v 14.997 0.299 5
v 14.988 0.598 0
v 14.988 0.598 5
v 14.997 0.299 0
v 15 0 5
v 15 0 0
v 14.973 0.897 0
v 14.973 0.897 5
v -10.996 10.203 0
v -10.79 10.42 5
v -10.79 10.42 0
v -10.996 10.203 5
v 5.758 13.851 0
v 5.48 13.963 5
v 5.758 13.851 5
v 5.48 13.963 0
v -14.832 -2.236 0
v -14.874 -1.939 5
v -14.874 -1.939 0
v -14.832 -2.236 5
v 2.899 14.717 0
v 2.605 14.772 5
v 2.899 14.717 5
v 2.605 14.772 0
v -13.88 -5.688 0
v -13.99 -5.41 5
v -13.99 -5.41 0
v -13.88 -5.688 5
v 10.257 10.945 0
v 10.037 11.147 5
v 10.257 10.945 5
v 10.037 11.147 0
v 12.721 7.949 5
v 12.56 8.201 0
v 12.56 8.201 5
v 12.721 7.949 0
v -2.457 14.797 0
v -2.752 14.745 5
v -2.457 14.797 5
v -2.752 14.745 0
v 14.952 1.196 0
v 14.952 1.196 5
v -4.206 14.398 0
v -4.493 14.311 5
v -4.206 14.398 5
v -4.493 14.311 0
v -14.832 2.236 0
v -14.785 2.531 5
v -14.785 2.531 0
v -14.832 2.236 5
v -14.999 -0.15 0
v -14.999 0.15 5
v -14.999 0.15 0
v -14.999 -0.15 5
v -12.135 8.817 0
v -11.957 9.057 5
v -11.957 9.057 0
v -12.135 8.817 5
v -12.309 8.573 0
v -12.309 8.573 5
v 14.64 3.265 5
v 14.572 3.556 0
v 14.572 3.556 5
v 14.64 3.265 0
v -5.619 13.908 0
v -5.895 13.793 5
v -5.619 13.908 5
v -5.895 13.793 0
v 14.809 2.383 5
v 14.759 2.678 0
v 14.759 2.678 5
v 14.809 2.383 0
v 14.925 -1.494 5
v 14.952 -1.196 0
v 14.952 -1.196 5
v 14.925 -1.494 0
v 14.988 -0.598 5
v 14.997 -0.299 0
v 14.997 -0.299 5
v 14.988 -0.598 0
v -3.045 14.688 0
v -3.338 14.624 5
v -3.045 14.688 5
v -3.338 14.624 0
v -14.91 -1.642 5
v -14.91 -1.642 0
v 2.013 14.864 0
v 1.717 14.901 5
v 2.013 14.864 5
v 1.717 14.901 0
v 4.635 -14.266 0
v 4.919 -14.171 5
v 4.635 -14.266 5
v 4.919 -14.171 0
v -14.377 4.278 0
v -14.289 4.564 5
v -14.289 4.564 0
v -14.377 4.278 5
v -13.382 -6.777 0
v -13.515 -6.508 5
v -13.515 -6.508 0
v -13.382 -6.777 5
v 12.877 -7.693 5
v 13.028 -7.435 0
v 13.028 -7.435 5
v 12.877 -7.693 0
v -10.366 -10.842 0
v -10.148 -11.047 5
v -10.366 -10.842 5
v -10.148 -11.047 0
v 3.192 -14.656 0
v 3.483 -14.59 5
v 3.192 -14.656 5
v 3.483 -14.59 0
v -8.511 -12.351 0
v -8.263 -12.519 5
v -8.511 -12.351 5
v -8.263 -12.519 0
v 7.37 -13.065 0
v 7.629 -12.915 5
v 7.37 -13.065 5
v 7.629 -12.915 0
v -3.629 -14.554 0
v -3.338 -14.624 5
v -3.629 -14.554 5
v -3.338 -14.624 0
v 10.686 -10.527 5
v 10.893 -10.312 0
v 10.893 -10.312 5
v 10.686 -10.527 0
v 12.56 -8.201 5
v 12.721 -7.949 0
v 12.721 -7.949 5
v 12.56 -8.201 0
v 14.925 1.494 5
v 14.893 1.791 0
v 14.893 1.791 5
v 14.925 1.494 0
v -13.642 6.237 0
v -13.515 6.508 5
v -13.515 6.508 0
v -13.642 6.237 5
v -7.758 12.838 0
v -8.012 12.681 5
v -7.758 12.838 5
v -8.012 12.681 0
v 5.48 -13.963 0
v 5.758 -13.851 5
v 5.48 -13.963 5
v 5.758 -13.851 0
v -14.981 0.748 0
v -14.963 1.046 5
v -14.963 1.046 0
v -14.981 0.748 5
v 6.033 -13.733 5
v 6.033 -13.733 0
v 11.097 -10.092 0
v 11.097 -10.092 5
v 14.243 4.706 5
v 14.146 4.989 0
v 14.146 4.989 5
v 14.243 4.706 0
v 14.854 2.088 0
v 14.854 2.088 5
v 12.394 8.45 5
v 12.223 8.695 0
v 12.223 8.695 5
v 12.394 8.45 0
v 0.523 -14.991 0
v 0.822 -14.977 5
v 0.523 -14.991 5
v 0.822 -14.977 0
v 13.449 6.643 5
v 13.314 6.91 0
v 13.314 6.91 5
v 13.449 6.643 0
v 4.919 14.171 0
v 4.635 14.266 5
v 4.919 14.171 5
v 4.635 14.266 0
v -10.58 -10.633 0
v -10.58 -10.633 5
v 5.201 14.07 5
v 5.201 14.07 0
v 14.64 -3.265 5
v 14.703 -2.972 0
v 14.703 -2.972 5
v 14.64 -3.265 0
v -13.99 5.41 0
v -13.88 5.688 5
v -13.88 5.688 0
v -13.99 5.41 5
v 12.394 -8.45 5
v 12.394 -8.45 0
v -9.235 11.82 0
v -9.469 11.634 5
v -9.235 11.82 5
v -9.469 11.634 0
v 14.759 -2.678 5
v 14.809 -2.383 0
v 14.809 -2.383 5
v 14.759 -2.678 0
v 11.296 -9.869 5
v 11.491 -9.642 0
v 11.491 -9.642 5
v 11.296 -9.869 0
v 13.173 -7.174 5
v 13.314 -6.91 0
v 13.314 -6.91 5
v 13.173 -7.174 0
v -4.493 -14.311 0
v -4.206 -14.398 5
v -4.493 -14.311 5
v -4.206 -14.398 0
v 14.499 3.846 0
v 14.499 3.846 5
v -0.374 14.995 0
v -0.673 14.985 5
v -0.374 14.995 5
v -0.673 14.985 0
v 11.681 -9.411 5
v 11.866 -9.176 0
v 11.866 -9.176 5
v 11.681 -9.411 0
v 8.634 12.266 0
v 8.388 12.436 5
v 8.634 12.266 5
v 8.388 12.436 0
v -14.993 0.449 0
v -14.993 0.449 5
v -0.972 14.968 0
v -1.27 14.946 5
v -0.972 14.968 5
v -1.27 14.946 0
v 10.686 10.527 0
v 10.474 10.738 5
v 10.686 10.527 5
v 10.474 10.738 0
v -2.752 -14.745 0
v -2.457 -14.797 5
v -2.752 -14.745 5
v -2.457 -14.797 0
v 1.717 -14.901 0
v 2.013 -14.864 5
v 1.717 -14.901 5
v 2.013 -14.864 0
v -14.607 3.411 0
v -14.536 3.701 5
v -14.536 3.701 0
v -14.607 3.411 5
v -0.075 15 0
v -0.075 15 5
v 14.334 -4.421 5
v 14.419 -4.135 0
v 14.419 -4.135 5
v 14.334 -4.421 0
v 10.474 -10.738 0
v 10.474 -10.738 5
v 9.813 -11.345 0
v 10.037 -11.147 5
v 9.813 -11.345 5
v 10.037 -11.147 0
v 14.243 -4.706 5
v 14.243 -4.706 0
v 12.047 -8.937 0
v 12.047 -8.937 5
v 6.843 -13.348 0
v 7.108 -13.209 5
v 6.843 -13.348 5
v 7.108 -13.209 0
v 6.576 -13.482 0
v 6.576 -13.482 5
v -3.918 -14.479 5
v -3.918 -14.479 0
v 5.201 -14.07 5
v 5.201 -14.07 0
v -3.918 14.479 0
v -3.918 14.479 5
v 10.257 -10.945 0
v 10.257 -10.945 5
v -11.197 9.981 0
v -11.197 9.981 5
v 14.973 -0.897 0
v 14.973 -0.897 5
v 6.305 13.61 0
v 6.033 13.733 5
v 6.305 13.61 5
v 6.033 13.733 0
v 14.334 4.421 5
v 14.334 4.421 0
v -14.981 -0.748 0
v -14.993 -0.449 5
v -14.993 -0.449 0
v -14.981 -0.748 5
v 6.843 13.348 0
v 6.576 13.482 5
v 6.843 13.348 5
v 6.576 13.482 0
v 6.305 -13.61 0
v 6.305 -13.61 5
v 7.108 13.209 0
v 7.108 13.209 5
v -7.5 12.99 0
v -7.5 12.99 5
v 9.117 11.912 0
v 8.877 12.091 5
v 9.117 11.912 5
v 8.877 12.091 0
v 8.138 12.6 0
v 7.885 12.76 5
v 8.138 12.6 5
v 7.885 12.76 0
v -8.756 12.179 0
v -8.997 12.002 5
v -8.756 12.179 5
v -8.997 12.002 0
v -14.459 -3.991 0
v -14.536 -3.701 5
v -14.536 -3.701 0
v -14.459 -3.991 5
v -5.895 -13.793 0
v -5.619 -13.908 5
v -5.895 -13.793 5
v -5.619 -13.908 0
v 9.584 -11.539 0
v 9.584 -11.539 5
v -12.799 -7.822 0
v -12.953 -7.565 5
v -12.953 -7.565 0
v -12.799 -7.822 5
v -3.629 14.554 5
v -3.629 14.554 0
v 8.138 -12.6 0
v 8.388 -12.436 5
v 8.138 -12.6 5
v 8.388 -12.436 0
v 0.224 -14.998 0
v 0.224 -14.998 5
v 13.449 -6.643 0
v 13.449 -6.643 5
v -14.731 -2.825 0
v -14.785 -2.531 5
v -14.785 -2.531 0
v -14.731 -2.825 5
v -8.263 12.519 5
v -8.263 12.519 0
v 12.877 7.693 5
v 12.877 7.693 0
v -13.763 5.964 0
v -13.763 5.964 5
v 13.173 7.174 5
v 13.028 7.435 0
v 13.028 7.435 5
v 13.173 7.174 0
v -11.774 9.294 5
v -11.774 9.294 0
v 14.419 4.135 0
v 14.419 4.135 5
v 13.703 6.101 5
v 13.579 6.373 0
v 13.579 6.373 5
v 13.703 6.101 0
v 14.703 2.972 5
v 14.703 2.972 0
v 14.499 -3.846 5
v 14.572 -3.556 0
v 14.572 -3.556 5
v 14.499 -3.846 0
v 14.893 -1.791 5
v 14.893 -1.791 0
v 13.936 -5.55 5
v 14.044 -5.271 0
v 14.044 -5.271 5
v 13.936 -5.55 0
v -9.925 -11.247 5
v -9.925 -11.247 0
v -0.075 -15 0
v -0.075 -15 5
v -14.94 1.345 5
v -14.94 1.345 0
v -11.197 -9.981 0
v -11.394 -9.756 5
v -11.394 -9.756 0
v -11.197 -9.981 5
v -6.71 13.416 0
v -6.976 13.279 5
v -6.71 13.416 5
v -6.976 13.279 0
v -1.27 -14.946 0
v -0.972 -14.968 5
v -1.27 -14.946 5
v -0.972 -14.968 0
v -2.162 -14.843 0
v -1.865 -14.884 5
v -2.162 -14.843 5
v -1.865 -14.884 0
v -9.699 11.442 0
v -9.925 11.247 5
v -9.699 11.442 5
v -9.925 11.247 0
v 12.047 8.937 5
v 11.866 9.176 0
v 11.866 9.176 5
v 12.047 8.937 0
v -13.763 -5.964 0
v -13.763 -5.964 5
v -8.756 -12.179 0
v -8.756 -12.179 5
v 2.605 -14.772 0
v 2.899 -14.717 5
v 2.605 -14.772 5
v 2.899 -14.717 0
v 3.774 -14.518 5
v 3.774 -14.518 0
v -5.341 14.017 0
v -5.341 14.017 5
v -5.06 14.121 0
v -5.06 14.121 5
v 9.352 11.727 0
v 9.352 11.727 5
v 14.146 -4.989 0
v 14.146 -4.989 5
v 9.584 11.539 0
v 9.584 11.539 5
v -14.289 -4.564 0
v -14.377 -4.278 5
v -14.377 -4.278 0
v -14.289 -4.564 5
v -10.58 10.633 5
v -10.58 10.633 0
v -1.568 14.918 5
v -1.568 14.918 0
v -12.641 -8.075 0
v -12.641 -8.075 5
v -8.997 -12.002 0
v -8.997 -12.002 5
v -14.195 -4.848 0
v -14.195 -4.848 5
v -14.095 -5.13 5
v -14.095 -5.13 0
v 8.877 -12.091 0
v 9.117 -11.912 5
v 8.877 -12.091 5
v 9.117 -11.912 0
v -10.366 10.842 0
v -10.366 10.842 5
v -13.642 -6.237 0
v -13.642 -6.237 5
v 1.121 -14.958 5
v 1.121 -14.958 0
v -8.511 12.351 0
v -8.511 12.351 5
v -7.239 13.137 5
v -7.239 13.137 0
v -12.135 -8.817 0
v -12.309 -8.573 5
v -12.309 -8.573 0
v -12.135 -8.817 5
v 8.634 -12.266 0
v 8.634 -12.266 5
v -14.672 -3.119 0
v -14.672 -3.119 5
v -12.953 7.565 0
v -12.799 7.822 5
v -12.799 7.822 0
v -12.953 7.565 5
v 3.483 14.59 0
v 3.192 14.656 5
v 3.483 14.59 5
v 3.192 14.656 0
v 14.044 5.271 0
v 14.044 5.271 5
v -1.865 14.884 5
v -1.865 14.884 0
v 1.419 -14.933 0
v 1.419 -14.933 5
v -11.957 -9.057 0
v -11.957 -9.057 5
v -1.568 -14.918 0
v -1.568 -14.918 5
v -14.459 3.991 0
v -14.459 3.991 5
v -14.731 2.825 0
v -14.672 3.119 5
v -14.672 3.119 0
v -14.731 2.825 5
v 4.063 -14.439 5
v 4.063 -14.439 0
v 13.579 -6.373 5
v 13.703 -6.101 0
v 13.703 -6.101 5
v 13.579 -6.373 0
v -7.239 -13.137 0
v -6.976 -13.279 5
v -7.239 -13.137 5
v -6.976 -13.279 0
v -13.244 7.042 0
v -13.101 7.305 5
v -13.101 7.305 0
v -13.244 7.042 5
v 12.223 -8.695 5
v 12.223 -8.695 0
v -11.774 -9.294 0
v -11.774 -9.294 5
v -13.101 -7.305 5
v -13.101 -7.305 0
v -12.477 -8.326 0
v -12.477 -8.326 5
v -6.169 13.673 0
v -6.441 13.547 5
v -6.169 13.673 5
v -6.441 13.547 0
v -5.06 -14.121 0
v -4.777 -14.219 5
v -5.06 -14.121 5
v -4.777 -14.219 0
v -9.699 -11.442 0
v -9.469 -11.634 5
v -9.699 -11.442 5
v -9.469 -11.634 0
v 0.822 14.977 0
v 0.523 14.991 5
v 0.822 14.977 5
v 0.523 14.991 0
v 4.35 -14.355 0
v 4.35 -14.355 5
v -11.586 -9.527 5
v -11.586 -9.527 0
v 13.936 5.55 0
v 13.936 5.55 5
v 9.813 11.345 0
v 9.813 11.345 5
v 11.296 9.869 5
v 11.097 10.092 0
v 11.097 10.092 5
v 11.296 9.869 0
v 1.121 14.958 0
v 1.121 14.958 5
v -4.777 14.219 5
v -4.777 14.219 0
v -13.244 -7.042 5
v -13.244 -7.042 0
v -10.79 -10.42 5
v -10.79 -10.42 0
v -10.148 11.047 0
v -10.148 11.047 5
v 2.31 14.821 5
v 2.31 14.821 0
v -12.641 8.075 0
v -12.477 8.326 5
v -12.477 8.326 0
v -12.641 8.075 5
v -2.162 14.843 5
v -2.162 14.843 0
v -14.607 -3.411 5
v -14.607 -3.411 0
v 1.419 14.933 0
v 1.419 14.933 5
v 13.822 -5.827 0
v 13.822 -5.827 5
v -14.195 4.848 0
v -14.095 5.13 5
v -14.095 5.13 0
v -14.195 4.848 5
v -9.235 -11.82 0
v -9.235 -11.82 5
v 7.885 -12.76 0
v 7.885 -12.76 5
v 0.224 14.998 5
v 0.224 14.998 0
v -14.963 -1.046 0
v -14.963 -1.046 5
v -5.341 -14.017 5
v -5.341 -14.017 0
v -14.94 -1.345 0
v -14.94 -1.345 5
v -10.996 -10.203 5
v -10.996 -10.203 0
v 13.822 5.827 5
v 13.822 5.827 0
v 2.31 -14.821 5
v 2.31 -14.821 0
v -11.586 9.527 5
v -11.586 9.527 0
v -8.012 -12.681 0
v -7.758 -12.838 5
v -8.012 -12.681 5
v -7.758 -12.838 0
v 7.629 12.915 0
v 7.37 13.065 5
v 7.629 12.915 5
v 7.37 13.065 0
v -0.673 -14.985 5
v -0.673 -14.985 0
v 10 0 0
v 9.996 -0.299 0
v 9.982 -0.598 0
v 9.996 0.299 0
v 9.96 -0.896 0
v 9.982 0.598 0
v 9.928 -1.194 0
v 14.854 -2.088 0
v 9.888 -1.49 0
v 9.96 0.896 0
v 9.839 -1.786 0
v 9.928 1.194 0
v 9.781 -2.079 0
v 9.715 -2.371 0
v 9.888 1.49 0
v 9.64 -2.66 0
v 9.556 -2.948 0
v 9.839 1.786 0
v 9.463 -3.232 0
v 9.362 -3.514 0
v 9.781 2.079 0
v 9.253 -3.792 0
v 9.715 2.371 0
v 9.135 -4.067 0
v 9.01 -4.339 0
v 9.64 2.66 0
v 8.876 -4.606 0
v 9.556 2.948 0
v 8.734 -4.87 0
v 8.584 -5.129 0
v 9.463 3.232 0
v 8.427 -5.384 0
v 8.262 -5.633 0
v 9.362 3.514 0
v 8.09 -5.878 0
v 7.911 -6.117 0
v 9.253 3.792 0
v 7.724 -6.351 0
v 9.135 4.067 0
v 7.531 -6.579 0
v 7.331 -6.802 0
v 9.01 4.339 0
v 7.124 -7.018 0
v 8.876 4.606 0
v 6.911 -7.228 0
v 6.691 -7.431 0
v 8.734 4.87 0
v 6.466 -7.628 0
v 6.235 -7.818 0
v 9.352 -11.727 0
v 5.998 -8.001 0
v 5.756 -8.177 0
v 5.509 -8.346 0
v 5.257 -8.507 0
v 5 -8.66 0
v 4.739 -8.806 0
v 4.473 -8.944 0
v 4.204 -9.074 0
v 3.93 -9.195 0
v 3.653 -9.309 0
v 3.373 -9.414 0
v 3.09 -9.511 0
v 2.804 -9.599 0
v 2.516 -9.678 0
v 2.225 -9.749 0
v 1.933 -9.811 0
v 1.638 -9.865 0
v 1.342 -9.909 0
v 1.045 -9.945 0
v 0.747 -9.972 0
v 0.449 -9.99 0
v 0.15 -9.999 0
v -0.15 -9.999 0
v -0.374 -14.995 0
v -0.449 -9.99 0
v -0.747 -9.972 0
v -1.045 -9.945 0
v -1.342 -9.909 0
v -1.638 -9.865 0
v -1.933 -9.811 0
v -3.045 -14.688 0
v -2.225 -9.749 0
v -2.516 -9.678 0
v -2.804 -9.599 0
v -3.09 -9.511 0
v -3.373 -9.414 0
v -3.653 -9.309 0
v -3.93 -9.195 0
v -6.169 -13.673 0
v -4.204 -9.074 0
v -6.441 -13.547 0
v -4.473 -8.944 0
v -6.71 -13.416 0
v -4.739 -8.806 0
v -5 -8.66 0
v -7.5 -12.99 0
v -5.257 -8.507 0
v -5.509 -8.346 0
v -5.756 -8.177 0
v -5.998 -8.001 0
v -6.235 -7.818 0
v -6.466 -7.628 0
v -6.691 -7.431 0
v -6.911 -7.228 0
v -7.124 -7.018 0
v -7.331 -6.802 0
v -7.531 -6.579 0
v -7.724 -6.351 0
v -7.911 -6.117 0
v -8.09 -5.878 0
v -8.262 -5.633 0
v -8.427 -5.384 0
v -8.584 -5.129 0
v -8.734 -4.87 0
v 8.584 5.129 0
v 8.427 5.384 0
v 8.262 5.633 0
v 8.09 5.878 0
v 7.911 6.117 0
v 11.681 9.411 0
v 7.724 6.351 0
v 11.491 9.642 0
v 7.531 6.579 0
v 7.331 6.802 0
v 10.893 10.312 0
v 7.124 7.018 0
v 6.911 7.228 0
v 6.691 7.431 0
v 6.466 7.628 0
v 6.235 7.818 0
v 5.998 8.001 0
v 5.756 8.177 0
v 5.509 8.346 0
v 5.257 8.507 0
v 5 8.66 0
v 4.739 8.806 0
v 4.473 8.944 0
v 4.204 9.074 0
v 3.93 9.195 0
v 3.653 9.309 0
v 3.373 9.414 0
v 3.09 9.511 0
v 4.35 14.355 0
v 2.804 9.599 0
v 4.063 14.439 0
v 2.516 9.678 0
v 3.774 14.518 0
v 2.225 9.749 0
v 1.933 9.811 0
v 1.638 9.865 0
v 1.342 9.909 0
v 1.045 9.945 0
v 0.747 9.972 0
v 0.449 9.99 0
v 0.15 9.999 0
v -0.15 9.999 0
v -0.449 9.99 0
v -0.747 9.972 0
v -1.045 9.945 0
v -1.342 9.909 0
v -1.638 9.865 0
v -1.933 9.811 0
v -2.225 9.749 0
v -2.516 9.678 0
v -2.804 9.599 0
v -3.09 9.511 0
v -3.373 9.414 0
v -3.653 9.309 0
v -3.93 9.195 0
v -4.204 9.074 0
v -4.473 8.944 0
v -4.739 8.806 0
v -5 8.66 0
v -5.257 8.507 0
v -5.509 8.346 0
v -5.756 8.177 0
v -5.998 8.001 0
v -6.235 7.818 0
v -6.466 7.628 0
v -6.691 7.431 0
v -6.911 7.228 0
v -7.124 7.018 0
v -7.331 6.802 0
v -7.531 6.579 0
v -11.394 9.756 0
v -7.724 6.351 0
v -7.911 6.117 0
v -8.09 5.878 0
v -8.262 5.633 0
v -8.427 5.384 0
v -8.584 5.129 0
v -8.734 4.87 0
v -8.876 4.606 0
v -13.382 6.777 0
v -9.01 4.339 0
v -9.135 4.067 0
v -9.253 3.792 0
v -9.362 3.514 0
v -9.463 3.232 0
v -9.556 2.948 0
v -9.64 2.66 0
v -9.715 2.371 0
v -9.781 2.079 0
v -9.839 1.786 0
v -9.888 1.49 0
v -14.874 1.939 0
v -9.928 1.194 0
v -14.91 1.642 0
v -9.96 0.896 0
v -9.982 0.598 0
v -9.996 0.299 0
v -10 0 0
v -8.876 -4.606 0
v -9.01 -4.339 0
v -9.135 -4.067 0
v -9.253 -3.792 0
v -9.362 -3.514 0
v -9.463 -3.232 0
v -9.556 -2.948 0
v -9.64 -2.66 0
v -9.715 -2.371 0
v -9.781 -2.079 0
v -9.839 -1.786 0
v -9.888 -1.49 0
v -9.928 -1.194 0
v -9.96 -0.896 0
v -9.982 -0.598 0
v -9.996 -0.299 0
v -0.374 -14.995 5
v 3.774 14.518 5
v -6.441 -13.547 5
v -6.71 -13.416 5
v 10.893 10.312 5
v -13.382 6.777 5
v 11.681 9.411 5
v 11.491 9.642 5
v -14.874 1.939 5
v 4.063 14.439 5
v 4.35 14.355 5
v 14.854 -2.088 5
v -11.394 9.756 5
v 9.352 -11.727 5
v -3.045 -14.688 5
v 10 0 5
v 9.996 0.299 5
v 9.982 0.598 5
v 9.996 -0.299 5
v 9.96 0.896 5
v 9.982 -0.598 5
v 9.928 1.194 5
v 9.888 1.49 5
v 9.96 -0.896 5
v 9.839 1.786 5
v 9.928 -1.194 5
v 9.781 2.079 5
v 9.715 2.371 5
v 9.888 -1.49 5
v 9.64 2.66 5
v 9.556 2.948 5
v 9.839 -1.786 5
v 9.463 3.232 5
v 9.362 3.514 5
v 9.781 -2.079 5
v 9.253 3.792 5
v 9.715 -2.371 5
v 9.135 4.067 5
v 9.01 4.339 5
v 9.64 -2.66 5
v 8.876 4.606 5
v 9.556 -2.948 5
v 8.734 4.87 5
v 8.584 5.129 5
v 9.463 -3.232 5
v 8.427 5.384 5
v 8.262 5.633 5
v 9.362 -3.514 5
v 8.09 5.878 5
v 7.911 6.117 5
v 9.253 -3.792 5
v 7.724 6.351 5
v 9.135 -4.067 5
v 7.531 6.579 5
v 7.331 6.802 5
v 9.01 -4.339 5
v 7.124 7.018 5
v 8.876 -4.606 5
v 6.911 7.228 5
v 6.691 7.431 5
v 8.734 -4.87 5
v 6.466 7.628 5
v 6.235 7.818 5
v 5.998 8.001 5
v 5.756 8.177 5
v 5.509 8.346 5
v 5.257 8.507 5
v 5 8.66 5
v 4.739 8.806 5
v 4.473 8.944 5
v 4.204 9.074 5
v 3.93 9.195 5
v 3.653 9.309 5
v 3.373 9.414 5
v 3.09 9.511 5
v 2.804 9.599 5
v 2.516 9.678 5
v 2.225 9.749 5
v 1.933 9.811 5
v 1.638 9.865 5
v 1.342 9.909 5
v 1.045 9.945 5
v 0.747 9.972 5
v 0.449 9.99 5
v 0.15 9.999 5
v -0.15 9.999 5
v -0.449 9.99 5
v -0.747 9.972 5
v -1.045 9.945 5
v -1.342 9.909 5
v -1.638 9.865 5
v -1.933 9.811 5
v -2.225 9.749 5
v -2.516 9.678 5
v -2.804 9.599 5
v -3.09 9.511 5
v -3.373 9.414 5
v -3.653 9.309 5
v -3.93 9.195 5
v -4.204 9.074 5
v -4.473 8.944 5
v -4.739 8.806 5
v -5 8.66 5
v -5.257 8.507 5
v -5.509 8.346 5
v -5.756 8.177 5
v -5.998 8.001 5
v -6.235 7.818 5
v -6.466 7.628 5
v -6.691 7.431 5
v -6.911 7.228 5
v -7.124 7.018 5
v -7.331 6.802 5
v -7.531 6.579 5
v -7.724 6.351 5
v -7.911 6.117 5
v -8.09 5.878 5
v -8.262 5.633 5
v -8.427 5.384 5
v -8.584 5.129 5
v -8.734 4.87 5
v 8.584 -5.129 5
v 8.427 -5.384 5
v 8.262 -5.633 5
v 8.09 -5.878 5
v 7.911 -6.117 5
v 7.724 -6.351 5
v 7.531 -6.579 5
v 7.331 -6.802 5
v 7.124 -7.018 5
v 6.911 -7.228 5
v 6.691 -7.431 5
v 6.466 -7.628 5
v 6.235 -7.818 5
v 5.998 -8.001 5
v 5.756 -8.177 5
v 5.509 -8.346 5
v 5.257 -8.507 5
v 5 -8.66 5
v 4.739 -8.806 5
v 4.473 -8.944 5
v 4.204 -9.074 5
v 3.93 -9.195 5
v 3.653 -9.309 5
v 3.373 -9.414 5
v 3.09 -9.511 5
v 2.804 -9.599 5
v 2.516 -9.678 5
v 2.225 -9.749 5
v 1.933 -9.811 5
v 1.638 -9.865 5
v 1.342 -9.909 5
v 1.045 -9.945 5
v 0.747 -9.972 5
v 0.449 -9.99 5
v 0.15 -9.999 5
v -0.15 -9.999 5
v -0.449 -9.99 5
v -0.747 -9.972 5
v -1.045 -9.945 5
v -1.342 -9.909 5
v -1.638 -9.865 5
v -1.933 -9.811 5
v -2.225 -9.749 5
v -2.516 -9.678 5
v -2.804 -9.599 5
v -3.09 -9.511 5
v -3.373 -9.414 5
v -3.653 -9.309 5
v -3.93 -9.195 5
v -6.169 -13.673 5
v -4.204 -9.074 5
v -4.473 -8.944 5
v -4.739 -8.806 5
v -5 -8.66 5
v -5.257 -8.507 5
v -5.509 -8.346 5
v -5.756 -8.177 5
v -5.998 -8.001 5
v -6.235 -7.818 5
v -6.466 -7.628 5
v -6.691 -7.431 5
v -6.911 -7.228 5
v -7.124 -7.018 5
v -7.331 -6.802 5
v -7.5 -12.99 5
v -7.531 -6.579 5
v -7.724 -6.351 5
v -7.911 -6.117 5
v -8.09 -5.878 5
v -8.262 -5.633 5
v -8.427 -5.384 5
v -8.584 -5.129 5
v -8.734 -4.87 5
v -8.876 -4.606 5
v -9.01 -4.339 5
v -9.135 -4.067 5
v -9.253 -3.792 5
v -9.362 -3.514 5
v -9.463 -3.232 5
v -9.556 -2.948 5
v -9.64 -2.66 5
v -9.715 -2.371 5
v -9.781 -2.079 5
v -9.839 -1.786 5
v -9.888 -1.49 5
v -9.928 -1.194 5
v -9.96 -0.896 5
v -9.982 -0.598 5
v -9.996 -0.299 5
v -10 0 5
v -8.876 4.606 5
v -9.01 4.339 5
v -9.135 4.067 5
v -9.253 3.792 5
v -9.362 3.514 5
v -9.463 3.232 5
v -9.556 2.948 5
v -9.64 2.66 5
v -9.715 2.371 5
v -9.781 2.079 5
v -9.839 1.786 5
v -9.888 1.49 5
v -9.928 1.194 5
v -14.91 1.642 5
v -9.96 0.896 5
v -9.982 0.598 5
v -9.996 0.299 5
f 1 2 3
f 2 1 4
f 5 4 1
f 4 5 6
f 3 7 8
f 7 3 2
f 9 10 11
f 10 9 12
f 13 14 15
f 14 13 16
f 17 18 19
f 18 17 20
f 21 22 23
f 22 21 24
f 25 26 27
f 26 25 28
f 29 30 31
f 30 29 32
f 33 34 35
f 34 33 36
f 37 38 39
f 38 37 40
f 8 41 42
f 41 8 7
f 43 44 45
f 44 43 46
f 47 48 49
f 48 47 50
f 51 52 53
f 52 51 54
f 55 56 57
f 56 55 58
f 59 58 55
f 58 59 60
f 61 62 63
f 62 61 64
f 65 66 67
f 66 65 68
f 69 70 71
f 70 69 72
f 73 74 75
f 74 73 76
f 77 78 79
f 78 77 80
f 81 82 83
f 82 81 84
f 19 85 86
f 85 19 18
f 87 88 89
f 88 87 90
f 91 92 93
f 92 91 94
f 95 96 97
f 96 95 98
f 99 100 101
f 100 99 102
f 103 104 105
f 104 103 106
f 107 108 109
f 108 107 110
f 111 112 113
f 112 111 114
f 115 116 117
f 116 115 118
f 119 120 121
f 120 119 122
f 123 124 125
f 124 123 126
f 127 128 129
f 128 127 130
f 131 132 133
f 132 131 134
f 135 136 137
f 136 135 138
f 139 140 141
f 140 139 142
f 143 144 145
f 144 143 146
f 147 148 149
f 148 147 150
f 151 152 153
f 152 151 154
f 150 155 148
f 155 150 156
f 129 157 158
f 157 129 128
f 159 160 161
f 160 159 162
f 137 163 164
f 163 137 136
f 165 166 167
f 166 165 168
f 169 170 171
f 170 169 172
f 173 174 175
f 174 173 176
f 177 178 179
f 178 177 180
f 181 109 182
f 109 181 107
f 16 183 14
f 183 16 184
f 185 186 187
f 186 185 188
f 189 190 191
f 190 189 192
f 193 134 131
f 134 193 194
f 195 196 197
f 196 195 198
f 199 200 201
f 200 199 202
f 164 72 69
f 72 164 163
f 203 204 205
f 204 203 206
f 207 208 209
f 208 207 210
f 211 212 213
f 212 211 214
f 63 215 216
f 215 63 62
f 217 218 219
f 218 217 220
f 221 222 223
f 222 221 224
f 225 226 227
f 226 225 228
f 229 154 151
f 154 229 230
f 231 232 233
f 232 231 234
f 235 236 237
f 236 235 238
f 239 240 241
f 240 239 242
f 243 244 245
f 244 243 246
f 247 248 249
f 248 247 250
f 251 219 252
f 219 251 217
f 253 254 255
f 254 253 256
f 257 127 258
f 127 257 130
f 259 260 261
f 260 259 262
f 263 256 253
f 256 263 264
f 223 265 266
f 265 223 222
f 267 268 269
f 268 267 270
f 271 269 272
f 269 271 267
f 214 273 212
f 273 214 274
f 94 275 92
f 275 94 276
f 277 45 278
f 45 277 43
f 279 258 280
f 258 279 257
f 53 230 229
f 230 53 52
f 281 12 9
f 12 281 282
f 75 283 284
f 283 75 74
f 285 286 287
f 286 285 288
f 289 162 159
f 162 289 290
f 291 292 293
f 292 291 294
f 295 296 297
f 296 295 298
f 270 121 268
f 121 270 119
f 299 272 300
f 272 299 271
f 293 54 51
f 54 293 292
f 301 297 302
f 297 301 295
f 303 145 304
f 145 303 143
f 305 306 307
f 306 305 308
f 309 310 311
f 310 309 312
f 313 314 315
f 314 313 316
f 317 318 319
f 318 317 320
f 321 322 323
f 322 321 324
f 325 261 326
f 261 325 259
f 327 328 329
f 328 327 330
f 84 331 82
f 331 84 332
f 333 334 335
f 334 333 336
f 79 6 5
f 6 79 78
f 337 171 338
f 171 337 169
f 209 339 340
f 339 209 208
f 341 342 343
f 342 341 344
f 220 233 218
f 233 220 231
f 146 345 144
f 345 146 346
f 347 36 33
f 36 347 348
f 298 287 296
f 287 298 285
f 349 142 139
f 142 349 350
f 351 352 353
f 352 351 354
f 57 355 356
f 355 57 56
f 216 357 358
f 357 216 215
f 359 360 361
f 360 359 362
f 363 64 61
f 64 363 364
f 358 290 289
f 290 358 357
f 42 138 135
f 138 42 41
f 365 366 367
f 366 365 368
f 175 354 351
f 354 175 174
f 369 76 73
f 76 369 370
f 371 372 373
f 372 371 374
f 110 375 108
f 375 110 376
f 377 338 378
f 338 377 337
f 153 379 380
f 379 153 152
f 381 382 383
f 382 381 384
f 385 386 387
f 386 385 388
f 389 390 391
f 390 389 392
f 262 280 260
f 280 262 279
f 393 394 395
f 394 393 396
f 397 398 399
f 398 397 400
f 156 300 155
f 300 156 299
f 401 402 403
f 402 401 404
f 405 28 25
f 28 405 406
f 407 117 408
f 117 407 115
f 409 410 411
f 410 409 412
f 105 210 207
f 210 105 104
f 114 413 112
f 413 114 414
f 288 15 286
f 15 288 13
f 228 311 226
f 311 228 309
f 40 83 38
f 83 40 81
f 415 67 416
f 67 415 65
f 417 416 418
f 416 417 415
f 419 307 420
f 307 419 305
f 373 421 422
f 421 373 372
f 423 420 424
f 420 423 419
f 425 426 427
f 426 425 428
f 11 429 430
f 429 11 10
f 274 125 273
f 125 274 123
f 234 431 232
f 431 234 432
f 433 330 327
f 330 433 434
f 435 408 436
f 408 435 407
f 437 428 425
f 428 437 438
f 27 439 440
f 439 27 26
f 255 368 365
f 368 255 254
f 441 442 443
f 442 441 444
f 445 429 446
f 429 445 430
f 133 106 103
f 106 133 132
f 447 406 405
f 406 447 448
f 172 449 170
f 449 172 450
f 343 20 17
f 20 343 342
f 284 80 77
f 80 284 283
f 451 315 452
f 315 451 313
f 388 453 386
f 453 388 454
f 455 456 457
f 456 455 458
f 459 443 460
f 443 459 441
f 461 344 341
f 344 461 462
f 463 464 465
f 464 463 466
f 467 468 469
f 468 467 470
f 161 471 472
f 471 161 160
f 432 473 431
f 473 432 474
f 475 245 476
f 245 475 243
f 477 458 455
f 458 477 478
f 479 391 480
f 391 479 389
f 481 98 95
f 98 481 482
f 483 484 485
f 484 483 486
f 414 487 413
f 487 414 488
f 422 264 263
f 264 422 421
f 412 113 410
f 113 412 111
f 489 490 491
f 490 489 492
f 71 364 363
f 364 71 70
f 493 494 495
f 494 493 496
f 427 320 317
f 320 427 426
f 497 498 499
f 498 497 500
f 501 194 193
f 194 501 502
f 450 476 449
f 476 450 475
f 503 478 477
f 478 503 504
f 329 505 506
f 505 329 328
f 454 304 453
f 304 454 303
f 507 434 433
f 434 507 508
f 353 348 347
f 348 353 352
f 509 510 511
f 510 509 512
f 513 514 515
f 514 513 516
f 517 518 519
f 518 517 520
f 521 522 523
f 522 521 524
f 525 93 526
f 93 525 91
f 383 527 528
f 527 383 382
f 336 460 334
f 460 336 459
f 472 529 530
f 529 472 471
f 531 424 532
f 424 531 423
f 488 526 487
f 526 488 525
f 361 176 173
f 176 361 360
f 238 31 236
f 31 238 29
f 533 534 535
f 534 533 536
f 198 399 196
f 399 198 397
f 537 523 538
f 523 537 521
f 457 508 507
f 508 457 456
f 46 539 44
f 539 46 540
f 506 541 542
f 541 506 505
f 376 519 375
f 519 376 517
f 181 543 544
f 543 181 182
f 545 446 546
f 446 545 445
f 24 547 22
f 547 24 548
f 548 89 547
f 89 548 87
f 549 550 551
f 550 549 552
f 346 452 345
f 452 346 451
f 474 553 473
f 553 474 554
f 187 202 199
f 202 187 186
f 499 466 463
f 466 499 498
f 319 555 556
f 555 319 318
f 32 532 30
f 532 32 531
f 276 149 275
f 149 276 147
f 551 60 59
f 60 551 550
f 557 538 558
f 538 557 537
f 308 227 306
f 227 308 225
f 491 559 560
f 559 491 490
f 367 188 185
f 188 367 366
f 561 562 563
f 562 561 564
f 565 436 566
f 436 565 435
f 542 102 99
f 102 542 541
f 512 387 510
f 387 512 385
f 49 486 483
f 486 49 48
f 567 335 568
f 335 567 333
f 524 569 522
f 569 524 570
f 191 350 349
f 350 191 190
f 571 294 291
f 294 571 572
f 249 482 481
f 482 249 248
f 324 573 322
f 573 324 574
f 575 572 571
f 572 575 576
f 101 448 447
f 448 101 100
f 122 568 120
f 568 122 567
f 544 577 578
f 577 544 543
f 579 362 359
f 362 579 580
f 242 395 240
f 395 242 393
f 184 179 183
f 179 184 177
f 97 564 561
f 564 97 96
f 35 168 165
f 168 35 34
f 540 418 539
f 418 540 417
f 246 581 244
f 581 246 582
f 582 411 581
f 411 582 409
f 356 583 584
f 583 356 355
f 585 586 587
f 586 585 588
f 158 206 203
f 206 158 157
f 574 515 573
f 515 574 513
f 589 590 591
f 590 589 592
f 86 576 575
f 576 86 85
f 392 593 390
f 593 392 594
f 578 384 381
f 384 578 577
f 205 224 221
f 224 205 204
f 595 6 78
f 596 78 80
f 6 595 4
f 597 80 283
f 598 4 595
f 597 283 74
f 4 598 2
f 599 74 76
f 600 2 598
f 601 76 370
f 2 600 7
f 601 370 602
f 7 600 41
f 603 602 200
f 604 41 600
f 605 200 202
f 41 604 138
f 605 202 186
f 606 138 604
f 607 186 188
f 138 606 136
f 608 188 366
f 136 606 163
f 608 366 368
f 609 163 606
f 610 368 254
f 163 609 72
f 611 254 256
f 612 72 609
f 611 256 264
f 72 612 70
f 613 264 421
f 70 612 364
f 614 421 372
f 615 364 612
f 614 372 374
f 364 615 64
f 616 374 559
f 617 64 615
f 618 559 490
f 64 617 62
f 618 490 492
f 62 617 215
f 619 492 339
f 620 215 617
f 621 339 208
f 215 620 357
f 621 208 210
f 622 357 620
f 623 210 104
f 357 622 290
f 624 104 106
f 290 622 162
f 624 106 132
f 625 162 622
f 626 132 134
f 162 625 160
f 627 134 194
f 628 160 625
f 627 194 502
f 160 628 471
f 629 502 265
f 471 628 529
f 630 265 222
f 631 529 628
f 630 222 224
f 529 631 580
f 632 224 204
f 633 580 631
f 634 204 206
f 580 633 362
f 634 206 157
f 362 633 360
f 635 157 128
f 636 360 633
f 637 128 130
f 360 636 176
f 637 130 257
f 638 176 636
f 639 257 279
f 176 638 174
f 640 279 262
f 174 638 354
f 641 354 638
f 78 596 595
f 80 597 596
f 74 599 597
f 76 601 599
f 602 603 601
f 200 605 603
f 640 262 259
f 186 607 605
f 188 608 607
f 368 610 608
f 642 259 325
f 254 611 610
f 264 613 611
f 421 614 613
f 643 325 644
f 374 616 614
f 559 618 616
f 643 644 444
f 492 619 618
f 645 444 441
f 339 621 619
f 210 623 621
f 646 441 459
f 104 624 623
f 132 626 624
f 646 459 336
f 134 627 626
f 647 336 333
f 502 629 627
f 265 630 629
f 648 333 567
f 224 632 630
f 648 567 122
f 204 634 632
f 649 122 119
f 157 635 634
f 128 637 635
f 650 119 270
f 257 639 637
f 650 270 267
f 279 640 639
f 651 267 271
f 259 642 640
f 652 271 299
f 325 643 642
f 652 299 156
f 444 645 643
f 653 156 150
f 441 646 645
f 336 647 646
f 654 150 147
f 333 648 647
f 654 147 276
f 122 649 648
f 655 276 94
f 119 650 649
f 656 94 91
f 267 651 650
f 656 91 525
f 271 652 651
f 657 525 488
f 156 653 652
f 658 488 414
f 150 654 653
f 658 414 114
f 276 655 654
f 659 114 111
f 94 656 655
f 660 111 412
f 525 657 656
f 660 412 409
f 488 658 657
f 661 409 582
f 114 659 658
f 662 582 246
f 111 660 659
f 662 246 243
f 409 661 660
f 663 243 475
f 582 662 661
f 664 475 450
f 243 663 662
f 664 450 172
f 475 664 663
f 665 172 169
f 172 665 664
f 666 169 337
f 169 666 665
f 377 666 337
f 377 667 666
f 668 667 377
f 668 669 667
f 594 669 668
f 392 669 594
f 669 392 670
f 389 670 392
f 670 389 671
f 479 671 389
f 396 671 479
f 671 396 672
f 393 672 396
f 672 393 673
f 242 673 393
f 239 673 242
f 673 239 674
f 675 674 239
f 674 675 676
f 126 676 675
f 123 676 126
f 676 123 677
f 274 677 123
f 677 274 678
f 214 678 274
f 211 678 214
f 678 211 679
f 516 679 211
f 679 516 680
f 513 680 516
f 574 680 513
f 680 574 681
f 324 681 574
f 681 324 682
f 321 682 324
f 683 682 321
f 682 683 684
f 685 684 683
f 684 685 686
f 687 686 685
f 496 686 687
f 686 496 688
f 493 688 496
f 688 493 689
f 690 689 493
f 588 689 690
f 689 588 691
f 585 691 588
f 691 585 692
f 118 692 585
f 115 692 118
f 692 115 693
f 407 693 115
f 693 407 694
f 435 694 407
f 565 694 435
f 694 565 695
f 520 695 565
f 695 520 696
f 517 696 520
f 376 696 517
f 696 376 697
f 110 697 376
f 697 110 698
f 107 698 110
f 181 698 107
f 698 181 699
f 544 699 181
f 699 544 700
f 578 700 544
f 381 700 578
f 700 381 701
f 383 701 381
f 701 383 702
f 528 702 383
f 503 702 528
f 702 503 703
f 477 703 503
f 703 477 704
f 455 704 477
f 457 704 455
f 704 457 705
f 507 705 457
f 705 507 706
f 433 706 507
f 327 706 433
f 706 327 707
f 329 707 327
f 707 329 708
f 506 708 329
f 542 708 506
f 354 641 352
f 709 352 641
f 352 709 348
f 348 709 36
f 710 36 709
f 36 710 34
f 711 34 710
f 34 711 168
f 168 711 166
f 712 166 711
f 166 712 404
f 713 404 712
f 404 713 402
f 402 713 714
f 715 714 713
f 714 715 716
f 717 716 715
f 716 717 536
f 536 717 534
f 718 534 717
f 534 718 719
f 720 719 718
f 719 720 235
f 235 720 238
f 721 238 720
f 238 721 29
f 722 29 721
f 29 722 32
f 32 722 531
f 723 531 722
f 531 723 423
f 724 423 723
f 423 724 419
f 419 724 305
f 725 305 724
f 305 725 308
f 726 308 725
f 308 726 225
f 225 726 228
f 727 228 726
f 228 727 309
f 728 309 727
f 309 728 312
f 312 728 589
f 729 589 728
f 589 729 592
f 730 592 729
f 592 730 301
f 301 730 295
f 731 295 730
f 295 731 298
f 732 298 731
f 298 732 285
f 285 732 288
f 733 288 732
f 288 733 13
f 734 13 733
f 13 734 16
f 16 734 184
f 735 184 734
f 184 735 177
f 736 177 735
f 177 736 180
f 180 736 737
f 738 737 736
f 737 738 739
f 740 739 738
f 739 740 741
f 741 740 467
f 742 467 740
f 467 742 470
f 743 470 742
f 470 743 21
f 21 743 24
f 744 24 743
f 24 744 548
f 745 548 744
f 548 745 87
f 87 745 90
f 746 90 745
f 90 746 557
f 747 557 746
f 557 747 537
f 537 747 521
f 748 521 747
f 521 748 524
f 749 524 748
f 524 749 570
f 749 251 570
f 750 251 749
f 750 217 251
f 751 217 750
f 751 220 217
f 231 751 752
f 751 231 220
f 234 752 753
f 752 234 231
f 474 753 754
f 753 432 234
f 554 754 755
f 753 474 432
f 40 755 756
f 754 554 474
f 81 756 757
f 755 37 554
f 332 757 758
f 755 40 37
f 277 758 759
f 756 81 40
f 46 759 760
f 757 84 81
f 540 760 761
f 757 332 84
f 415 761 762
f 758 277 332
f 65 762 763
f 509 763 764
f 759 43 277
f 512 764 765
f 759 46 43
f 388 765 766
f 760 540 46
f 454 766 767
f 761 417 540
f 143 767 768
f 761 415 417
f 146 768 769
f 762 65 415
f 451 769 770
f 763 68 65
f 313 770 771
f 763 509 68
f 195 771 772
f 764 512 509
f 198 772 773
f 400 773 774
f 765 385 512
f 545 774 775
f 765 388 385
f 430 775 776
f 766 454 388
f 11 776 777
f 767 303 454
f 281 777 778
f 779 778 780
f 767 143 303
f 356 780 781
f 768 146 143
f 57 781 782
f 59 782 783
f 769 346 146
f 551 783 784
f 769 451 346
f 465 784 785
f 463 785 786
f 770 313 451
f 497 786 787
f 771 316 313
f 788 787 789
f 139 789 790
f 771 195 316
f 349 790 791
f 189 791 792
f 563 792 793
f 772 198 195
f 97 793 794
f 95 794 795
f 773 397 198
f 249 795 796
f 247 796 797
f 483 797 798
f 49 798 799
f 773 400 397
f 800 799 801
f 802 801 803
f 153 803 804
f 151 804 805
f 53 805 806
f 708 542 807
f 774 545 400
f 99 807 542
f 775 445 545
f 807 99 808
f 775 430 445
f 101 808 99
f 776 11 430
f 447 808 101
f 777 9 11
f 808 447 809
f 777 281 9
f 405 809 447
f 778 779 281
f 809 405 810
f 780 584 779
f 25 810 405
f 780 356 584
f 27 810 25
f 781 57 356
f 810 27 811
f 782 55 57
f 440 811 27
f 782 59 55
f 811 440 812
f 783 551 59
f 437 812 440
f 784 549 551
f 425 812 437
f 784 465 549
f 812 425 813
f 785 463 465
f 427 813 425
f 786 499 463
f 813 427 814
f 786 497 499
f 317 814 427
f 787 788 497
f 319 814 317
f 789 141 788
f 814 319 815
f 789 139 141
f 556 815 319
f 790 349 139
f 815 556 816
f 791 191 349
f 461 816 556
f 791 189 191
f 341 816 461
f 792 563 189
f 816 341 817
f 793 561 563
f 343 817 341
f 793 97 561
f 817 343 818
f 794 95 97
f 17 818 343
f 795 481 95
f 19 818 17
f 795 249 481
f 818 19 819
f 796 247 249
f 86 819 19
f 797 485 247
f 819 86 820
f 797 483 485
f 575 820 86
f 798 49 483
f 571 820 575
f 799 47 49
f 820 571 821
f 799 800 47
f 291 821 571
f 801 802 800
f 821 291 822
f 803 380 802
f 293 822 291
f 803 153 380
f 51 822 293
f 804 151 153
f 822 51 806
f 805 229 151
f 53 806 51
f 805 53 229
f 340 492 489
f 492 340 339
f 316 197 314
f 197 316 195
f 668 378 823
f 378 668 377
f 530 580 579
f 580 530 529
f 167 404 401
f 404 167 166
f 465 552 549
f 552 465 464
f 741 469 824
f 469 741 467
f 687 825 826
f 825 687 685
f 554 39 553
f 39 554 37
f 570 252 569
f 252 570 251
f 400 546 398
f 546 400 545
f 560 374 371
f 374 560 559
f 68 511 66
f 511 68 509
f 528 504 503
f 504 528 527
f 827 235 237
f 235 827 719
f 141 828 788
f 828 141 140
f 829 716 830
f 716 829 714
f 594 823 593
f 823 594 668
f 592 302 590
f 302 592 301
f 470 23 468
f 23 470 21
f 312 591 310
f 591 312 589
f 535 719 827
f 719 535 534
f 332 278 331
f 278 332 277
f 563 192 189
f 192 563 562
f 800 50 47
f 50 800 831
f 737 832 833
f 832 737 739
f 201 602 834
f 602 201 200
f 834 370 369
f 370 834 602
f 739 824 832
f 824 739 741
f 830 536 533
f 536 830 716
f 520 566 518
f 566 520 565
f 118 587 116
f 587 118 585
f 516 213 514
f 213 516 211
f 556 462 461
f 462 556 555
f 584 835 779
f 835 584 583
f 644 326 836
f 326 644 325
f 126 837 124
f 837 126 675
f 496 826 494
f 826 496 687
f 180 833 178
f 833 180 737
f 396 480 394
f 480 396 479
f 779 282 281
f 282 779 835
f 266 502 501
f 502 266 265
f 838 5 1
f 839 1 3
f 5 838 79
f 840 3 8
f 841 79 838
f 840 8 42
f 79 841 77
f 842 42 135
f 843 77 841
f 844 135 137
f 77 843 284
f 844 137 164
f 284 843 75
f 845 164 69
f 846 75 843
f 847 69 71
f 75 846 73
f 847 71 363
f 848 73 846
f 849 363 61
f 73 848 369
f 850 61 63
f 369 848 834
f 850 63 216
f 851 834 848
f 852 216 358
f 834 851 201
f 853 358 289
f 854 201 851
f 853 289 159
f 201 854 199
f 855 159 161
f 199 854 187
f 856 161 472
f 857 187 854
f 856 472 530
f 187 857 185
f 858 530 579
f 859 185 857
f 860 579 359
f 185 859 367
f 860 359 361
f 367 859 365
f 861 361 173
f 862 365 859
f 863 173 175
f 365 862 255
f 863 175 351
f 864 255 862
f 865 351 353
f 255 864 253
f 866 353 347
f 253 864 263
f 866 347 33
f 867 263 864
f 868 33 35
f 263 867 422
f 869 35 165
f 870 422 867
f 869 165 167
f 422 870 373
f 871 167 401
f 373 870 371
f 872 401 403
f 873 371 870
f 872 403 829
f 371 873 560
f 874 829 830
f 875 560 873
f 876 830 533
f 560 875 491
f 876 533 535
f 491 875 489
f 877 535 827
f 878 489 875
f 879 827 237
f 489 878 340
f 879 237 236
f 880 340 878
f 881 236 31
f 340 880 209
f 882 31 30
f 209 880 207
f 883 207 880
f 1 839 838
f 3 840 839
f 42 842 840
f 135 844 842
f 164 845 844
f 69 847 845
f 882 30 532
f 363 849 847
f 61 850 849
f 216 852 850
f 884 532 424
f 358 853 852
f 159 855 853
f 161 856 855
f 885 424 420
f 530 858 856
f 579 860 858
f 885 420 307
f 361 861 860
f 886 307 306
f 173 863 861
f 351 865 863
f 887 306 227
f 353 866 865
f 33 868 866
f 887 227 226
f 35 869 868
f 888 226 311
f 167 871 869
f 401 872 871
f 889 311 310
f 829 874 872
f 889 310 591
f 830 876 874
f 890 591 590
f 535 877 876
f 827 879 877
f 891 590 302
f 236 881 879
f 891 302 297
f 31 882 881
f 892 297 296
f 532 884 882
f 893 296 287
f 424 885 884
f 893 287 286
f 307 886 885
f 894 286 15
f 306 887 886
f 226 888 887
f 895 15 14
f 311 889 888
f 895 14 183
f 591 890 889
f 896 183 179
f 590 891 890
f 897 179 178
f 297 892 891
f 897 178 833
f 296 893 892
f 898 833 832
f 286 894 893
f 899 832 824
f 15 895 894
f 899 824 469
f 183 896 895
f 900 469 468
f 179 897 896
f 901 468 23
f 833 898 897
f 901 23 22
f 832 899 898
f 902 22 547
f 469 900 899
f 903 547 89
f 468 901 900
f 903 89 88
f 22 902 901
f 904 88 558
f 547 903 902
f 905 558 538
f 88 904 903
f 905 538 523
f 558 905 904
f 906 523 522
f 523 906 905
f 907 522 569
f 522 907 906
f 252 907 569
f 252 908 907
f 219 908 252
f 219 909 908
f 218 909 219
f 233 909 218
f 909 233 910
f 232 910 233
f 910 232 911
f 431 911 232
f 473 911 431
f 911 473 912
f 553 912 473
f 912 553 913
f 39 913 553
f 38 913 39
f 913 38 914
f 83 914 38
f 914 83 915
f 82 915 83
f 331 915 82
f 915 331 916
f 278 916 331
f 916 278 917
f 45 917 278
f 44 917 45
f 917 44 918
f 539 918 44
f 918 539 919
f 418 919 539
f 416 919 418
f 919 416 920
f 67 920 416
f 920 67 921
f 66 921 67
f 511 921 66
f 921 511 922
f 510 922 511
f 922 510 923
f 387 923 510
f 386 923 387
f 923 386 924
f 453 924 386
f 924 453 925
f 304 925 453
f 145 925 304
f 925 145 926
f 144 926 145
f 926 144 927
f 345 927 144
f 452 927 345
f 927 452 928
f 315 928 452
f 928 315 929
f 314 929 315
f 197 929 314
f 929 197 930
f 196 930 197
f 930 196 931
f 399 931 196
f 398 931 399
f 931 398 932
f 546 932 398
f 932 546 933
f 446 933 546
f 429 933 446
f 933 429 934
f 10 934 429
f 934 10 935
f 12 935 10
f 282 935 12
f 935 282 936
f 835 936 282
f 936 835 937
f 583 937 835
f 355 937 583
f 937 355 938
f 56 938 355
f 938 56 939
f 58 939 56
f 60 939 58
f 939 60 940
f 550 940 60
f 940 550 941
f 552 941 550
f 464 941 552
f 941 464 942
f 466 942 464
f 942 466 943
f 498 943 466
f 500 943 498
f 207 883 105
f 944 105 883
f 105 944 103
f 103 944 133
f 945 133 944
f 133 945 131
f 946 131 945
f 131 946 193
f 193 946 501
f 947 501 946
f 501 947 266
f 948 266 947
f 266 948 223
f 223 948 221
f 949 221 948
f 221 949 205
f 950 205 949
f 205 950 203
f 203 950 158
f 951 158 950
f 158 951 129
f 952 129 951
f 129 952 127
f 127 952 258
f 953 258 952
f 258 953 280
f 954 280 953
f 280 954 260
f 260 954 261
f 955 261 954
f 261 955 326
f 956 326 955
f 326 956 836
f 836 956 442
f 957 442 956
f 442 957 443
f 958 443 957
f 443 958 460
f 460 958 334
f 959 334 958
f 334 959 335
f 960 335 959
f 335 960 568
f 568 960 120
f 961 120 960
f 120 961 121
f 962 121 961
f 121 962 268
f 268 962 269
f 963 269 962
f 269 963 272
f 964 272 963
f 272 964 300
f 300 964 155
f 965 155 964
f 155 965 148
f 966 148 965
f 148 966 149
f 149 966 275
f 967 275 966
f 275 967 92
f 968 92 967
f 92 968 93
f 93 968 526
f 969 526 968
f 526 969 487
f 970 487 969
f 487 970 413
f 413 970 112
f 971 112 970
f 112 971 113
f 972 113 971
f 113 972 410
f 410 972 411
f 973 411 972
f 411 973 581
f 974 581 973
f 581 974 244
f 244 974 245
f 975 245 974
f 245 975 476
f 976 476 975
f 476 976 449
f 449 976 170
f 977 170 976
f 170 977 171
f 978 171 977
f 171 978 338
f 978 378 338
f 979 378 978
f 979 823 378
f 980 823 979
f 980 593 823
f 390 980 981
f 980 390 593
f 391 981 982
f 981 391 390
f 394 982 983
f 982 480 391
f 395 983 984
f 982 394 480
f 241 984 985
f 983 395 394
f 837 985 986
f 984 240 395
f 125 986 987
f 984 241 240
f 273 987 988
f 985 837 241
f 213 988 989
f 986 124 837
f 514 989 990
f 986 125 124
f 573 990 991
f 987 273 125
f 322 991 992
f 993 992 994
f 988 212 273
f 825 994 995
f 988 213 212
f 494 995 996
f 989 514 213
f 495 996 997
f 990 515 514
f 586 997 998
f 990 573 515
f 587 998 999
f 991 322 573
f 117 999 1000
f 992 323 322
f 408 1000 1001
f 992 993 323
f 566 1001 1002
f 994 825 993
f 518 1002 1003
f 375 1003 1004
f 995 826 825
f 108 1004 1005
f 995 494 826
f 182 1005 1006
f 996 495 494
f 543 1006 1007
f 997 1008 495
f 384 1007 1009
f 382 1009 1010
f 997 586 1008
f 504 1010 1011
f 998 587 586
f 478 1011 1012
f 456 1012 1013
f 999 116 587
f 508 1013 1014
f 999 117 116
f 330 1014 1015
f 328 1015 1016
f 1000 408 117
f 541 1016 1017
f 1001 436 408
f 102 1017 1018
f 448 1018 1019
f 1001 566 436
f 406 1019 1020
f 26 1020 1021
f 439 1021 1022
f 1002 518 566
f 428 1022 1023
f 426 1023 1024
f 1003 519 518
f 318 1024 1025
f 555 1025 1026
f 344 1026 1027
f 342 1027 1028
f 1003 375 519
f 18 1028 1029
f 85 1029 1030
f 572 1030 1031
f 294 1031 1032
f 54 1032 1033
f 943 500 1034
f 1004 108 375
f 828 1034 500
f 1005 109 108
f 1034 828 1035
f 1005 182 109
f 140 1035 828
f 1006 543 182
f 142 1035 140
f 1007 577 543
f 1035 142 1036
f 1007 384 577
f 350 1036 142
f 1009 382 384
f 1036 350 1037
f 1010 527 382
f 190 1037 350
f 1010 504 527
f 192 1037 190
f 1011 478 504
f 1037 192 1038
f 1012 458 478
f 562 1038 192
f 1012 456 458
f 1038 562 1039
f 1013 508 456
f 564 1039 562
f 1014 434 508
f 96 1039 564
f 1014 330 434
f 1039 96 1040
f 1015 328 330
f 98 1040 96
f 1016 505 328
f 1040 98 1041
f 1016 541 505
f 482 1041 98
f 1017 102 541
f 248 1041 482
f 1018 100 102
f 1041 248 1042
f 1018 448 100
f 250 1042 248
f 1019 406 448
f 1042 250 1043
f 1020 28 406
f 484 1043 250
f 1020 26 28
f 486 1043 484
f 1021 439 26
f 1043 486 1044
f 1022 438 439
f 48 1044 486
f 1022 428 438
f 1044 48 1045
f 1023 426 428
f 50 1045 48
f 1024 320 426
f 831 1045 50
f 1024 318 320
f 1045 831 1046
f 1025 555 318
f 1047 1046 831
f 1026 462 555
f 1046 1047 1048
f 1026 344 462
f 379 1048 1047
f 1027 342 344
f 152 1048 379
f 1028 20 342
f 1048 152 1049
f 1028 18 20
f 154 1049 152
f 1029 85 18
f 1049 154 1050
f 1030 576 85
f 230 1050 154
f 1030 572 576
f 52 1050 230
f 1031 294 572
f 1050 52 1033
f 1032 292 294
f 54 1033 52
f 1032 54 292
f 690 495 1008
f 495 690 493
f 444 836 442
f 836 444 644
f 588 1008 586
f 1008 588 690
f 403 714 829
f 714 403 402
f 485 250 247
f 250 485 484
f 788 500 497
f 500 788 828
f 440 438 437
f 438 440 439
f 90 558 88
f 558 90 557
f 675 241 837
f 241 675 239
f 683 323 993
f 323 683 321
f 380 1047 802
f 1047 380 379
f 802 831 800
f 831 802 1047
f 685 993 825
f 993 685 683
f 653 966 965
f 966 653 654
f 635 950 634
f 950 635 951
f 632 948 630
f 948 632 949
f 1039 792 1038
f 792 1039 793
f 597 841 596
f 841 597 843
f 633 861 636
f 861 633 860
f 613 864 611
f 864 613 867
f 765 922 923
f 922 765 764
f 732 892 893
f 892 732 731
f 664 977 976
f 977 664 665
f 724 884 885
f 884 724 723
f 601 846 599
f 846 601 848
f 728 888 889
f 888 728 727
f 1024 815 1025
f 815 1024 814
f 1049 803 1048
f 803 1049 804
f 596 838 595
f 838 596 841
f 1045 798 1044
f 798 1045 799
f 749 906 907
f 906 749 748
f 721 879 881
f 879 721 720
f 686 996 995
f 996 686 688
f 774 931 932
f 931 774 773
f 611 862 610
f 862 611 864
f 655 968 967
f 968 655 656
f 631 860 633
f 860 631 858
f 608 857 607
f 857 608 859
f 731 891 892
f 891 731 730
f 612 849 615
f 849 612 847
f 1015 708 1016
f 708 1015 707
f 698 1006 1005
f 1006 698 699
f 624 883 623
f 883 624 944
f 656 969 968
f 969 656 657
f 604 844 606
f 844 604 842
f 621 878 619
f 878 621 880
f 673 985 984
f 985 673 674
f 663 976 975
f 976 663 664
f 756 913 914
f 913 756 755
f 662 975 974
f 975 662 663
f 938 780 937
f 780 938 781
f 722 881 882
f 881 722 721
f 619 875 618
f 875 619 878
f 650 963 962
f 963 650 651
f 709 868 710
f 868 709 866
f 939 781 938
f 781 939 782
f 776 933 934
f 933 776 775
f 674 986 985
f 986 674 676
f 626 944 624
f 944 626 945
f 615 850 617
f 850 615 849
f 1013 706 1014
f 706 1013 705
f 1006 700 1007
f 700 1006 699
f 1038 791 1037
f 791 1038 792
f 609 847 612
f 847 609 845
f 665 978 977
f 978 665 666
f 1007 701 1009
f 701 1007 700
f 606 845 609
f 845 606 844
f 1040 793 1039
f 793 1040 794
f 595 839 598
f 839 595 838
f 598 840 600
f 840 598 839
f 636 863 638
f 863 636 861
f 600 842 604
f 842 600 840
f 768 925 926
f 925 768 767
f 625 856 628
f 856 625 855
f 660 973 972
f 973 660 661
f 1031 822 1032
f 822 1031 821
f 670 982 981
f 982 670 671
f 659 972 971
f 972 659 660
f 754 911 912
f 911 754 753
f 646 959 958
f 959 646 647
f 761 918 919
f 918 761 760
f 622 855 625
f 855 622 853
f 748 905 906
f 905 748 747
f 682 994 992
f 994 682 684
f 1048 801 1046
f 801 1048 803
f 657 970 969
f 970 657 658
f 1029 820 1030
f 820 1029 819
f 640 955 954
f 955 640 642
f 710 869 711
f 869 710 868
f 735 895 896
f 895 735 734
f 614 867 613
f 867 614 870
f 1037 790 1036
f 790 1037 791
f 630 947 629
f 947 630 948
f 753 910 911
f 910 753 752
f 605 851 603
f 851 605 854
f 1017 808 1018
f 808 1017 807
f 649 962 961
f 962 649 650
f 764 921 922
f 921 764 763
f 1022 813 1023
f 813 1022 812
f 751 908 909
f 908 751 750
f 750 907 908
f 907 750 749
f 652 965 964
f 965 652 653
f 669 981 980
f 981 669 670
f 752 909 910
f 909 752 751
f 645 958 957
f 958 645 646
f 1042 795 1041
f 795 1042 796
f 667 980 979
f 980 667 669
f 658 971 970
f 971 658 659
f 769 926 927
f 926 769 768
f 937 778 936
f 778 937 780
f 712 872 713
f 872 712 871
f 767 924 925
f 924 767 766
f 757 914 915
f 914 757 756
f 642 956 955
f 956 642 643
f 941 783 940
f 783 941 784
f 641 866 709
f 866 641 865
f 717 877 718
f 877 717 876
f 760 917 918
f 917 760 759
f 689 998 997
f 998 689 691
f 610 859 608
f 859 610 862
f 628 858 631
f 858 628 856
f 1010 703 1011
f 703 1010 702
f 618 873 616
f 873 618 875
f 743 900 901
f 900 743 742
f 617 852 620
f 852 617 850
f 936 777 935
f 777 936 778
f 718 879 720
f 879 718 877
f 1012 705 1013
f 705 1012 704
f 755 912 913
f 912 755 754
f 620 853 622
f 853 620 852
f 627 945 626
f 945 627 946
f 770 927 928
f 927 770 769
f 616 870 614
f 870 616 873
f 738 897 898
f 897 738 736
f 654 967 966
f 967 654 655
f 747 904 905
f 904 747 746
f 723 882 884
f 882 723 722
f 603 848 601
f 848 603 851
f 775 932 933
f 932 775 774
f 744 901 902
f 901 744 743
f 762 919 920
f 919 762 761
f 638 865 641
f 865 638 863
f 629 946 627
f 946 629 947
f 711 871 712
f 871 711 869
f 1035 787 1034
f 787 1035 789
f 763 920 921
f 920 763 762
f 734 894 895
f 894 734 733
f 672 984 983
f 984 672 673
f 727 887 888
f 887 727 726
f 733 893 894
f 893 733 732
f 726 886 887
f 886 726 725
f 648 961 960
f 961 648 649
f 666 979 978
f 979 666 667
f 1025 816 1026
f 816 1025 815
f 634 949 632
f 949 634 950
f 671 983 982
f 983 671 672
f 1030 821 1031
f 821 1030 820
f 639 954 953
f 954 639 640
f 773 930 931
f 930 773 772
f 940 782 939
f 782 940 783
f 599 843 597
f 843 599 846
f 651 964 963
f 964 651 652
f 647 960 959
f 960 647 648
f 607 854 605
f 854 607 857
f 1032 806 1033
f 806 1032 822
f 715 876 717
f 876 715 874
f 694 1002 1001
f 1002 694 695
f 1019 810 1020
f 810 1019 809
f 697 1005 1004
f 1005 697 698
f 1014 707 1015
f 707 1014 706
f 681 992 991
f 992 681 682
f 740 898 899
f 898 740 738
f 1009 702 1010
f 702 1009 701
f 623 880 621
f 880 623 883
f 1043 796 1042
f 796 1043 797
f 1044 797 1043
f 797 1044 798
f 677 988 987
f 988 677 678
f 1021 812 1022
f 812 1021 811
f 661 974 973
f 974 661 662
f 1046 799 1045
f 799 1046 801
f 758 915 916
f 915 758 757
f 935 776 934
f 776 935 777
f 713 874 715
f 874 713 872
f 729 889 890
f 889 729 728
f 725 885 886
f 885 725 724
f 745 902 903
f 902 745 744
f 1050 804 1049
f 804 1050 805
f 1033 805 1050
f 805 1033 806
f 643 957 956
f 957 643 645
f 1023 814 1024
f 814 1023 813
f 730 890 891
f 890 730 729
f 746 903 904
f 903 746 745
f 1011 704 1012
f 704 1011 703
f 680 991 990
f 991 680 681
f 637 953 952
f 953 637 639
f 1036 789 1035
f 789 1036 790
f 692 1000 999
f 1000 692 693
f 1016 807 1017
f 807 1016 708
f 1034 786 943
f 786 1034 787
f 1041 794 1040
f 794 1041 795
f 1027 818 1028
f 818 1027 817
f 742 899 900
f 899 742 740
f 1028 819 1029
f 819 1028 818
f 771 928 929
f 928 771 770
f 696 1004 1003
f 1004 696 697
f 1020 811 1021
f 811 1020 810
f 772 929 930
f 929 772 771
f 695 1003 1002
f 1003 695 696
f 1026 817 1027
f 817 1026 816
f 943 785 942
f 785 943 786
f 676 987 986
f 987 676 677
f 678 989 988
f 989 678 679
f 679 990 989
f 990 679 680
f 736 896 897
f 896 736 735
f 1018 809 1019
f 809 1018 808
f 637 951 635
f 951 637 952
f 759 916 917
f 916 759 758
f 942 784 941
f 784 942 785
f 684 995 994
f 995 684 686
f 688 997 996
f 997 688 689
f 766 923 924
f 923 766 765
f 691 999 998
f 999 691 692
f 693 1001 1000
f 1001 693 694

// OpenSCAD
$fs = 0.3;
$fa = 1;

difference() {
	cylinder(r=15, h=5);
	translate([0, 0, -1]) {
		cylinder(r=10, h=7);
	}
}
